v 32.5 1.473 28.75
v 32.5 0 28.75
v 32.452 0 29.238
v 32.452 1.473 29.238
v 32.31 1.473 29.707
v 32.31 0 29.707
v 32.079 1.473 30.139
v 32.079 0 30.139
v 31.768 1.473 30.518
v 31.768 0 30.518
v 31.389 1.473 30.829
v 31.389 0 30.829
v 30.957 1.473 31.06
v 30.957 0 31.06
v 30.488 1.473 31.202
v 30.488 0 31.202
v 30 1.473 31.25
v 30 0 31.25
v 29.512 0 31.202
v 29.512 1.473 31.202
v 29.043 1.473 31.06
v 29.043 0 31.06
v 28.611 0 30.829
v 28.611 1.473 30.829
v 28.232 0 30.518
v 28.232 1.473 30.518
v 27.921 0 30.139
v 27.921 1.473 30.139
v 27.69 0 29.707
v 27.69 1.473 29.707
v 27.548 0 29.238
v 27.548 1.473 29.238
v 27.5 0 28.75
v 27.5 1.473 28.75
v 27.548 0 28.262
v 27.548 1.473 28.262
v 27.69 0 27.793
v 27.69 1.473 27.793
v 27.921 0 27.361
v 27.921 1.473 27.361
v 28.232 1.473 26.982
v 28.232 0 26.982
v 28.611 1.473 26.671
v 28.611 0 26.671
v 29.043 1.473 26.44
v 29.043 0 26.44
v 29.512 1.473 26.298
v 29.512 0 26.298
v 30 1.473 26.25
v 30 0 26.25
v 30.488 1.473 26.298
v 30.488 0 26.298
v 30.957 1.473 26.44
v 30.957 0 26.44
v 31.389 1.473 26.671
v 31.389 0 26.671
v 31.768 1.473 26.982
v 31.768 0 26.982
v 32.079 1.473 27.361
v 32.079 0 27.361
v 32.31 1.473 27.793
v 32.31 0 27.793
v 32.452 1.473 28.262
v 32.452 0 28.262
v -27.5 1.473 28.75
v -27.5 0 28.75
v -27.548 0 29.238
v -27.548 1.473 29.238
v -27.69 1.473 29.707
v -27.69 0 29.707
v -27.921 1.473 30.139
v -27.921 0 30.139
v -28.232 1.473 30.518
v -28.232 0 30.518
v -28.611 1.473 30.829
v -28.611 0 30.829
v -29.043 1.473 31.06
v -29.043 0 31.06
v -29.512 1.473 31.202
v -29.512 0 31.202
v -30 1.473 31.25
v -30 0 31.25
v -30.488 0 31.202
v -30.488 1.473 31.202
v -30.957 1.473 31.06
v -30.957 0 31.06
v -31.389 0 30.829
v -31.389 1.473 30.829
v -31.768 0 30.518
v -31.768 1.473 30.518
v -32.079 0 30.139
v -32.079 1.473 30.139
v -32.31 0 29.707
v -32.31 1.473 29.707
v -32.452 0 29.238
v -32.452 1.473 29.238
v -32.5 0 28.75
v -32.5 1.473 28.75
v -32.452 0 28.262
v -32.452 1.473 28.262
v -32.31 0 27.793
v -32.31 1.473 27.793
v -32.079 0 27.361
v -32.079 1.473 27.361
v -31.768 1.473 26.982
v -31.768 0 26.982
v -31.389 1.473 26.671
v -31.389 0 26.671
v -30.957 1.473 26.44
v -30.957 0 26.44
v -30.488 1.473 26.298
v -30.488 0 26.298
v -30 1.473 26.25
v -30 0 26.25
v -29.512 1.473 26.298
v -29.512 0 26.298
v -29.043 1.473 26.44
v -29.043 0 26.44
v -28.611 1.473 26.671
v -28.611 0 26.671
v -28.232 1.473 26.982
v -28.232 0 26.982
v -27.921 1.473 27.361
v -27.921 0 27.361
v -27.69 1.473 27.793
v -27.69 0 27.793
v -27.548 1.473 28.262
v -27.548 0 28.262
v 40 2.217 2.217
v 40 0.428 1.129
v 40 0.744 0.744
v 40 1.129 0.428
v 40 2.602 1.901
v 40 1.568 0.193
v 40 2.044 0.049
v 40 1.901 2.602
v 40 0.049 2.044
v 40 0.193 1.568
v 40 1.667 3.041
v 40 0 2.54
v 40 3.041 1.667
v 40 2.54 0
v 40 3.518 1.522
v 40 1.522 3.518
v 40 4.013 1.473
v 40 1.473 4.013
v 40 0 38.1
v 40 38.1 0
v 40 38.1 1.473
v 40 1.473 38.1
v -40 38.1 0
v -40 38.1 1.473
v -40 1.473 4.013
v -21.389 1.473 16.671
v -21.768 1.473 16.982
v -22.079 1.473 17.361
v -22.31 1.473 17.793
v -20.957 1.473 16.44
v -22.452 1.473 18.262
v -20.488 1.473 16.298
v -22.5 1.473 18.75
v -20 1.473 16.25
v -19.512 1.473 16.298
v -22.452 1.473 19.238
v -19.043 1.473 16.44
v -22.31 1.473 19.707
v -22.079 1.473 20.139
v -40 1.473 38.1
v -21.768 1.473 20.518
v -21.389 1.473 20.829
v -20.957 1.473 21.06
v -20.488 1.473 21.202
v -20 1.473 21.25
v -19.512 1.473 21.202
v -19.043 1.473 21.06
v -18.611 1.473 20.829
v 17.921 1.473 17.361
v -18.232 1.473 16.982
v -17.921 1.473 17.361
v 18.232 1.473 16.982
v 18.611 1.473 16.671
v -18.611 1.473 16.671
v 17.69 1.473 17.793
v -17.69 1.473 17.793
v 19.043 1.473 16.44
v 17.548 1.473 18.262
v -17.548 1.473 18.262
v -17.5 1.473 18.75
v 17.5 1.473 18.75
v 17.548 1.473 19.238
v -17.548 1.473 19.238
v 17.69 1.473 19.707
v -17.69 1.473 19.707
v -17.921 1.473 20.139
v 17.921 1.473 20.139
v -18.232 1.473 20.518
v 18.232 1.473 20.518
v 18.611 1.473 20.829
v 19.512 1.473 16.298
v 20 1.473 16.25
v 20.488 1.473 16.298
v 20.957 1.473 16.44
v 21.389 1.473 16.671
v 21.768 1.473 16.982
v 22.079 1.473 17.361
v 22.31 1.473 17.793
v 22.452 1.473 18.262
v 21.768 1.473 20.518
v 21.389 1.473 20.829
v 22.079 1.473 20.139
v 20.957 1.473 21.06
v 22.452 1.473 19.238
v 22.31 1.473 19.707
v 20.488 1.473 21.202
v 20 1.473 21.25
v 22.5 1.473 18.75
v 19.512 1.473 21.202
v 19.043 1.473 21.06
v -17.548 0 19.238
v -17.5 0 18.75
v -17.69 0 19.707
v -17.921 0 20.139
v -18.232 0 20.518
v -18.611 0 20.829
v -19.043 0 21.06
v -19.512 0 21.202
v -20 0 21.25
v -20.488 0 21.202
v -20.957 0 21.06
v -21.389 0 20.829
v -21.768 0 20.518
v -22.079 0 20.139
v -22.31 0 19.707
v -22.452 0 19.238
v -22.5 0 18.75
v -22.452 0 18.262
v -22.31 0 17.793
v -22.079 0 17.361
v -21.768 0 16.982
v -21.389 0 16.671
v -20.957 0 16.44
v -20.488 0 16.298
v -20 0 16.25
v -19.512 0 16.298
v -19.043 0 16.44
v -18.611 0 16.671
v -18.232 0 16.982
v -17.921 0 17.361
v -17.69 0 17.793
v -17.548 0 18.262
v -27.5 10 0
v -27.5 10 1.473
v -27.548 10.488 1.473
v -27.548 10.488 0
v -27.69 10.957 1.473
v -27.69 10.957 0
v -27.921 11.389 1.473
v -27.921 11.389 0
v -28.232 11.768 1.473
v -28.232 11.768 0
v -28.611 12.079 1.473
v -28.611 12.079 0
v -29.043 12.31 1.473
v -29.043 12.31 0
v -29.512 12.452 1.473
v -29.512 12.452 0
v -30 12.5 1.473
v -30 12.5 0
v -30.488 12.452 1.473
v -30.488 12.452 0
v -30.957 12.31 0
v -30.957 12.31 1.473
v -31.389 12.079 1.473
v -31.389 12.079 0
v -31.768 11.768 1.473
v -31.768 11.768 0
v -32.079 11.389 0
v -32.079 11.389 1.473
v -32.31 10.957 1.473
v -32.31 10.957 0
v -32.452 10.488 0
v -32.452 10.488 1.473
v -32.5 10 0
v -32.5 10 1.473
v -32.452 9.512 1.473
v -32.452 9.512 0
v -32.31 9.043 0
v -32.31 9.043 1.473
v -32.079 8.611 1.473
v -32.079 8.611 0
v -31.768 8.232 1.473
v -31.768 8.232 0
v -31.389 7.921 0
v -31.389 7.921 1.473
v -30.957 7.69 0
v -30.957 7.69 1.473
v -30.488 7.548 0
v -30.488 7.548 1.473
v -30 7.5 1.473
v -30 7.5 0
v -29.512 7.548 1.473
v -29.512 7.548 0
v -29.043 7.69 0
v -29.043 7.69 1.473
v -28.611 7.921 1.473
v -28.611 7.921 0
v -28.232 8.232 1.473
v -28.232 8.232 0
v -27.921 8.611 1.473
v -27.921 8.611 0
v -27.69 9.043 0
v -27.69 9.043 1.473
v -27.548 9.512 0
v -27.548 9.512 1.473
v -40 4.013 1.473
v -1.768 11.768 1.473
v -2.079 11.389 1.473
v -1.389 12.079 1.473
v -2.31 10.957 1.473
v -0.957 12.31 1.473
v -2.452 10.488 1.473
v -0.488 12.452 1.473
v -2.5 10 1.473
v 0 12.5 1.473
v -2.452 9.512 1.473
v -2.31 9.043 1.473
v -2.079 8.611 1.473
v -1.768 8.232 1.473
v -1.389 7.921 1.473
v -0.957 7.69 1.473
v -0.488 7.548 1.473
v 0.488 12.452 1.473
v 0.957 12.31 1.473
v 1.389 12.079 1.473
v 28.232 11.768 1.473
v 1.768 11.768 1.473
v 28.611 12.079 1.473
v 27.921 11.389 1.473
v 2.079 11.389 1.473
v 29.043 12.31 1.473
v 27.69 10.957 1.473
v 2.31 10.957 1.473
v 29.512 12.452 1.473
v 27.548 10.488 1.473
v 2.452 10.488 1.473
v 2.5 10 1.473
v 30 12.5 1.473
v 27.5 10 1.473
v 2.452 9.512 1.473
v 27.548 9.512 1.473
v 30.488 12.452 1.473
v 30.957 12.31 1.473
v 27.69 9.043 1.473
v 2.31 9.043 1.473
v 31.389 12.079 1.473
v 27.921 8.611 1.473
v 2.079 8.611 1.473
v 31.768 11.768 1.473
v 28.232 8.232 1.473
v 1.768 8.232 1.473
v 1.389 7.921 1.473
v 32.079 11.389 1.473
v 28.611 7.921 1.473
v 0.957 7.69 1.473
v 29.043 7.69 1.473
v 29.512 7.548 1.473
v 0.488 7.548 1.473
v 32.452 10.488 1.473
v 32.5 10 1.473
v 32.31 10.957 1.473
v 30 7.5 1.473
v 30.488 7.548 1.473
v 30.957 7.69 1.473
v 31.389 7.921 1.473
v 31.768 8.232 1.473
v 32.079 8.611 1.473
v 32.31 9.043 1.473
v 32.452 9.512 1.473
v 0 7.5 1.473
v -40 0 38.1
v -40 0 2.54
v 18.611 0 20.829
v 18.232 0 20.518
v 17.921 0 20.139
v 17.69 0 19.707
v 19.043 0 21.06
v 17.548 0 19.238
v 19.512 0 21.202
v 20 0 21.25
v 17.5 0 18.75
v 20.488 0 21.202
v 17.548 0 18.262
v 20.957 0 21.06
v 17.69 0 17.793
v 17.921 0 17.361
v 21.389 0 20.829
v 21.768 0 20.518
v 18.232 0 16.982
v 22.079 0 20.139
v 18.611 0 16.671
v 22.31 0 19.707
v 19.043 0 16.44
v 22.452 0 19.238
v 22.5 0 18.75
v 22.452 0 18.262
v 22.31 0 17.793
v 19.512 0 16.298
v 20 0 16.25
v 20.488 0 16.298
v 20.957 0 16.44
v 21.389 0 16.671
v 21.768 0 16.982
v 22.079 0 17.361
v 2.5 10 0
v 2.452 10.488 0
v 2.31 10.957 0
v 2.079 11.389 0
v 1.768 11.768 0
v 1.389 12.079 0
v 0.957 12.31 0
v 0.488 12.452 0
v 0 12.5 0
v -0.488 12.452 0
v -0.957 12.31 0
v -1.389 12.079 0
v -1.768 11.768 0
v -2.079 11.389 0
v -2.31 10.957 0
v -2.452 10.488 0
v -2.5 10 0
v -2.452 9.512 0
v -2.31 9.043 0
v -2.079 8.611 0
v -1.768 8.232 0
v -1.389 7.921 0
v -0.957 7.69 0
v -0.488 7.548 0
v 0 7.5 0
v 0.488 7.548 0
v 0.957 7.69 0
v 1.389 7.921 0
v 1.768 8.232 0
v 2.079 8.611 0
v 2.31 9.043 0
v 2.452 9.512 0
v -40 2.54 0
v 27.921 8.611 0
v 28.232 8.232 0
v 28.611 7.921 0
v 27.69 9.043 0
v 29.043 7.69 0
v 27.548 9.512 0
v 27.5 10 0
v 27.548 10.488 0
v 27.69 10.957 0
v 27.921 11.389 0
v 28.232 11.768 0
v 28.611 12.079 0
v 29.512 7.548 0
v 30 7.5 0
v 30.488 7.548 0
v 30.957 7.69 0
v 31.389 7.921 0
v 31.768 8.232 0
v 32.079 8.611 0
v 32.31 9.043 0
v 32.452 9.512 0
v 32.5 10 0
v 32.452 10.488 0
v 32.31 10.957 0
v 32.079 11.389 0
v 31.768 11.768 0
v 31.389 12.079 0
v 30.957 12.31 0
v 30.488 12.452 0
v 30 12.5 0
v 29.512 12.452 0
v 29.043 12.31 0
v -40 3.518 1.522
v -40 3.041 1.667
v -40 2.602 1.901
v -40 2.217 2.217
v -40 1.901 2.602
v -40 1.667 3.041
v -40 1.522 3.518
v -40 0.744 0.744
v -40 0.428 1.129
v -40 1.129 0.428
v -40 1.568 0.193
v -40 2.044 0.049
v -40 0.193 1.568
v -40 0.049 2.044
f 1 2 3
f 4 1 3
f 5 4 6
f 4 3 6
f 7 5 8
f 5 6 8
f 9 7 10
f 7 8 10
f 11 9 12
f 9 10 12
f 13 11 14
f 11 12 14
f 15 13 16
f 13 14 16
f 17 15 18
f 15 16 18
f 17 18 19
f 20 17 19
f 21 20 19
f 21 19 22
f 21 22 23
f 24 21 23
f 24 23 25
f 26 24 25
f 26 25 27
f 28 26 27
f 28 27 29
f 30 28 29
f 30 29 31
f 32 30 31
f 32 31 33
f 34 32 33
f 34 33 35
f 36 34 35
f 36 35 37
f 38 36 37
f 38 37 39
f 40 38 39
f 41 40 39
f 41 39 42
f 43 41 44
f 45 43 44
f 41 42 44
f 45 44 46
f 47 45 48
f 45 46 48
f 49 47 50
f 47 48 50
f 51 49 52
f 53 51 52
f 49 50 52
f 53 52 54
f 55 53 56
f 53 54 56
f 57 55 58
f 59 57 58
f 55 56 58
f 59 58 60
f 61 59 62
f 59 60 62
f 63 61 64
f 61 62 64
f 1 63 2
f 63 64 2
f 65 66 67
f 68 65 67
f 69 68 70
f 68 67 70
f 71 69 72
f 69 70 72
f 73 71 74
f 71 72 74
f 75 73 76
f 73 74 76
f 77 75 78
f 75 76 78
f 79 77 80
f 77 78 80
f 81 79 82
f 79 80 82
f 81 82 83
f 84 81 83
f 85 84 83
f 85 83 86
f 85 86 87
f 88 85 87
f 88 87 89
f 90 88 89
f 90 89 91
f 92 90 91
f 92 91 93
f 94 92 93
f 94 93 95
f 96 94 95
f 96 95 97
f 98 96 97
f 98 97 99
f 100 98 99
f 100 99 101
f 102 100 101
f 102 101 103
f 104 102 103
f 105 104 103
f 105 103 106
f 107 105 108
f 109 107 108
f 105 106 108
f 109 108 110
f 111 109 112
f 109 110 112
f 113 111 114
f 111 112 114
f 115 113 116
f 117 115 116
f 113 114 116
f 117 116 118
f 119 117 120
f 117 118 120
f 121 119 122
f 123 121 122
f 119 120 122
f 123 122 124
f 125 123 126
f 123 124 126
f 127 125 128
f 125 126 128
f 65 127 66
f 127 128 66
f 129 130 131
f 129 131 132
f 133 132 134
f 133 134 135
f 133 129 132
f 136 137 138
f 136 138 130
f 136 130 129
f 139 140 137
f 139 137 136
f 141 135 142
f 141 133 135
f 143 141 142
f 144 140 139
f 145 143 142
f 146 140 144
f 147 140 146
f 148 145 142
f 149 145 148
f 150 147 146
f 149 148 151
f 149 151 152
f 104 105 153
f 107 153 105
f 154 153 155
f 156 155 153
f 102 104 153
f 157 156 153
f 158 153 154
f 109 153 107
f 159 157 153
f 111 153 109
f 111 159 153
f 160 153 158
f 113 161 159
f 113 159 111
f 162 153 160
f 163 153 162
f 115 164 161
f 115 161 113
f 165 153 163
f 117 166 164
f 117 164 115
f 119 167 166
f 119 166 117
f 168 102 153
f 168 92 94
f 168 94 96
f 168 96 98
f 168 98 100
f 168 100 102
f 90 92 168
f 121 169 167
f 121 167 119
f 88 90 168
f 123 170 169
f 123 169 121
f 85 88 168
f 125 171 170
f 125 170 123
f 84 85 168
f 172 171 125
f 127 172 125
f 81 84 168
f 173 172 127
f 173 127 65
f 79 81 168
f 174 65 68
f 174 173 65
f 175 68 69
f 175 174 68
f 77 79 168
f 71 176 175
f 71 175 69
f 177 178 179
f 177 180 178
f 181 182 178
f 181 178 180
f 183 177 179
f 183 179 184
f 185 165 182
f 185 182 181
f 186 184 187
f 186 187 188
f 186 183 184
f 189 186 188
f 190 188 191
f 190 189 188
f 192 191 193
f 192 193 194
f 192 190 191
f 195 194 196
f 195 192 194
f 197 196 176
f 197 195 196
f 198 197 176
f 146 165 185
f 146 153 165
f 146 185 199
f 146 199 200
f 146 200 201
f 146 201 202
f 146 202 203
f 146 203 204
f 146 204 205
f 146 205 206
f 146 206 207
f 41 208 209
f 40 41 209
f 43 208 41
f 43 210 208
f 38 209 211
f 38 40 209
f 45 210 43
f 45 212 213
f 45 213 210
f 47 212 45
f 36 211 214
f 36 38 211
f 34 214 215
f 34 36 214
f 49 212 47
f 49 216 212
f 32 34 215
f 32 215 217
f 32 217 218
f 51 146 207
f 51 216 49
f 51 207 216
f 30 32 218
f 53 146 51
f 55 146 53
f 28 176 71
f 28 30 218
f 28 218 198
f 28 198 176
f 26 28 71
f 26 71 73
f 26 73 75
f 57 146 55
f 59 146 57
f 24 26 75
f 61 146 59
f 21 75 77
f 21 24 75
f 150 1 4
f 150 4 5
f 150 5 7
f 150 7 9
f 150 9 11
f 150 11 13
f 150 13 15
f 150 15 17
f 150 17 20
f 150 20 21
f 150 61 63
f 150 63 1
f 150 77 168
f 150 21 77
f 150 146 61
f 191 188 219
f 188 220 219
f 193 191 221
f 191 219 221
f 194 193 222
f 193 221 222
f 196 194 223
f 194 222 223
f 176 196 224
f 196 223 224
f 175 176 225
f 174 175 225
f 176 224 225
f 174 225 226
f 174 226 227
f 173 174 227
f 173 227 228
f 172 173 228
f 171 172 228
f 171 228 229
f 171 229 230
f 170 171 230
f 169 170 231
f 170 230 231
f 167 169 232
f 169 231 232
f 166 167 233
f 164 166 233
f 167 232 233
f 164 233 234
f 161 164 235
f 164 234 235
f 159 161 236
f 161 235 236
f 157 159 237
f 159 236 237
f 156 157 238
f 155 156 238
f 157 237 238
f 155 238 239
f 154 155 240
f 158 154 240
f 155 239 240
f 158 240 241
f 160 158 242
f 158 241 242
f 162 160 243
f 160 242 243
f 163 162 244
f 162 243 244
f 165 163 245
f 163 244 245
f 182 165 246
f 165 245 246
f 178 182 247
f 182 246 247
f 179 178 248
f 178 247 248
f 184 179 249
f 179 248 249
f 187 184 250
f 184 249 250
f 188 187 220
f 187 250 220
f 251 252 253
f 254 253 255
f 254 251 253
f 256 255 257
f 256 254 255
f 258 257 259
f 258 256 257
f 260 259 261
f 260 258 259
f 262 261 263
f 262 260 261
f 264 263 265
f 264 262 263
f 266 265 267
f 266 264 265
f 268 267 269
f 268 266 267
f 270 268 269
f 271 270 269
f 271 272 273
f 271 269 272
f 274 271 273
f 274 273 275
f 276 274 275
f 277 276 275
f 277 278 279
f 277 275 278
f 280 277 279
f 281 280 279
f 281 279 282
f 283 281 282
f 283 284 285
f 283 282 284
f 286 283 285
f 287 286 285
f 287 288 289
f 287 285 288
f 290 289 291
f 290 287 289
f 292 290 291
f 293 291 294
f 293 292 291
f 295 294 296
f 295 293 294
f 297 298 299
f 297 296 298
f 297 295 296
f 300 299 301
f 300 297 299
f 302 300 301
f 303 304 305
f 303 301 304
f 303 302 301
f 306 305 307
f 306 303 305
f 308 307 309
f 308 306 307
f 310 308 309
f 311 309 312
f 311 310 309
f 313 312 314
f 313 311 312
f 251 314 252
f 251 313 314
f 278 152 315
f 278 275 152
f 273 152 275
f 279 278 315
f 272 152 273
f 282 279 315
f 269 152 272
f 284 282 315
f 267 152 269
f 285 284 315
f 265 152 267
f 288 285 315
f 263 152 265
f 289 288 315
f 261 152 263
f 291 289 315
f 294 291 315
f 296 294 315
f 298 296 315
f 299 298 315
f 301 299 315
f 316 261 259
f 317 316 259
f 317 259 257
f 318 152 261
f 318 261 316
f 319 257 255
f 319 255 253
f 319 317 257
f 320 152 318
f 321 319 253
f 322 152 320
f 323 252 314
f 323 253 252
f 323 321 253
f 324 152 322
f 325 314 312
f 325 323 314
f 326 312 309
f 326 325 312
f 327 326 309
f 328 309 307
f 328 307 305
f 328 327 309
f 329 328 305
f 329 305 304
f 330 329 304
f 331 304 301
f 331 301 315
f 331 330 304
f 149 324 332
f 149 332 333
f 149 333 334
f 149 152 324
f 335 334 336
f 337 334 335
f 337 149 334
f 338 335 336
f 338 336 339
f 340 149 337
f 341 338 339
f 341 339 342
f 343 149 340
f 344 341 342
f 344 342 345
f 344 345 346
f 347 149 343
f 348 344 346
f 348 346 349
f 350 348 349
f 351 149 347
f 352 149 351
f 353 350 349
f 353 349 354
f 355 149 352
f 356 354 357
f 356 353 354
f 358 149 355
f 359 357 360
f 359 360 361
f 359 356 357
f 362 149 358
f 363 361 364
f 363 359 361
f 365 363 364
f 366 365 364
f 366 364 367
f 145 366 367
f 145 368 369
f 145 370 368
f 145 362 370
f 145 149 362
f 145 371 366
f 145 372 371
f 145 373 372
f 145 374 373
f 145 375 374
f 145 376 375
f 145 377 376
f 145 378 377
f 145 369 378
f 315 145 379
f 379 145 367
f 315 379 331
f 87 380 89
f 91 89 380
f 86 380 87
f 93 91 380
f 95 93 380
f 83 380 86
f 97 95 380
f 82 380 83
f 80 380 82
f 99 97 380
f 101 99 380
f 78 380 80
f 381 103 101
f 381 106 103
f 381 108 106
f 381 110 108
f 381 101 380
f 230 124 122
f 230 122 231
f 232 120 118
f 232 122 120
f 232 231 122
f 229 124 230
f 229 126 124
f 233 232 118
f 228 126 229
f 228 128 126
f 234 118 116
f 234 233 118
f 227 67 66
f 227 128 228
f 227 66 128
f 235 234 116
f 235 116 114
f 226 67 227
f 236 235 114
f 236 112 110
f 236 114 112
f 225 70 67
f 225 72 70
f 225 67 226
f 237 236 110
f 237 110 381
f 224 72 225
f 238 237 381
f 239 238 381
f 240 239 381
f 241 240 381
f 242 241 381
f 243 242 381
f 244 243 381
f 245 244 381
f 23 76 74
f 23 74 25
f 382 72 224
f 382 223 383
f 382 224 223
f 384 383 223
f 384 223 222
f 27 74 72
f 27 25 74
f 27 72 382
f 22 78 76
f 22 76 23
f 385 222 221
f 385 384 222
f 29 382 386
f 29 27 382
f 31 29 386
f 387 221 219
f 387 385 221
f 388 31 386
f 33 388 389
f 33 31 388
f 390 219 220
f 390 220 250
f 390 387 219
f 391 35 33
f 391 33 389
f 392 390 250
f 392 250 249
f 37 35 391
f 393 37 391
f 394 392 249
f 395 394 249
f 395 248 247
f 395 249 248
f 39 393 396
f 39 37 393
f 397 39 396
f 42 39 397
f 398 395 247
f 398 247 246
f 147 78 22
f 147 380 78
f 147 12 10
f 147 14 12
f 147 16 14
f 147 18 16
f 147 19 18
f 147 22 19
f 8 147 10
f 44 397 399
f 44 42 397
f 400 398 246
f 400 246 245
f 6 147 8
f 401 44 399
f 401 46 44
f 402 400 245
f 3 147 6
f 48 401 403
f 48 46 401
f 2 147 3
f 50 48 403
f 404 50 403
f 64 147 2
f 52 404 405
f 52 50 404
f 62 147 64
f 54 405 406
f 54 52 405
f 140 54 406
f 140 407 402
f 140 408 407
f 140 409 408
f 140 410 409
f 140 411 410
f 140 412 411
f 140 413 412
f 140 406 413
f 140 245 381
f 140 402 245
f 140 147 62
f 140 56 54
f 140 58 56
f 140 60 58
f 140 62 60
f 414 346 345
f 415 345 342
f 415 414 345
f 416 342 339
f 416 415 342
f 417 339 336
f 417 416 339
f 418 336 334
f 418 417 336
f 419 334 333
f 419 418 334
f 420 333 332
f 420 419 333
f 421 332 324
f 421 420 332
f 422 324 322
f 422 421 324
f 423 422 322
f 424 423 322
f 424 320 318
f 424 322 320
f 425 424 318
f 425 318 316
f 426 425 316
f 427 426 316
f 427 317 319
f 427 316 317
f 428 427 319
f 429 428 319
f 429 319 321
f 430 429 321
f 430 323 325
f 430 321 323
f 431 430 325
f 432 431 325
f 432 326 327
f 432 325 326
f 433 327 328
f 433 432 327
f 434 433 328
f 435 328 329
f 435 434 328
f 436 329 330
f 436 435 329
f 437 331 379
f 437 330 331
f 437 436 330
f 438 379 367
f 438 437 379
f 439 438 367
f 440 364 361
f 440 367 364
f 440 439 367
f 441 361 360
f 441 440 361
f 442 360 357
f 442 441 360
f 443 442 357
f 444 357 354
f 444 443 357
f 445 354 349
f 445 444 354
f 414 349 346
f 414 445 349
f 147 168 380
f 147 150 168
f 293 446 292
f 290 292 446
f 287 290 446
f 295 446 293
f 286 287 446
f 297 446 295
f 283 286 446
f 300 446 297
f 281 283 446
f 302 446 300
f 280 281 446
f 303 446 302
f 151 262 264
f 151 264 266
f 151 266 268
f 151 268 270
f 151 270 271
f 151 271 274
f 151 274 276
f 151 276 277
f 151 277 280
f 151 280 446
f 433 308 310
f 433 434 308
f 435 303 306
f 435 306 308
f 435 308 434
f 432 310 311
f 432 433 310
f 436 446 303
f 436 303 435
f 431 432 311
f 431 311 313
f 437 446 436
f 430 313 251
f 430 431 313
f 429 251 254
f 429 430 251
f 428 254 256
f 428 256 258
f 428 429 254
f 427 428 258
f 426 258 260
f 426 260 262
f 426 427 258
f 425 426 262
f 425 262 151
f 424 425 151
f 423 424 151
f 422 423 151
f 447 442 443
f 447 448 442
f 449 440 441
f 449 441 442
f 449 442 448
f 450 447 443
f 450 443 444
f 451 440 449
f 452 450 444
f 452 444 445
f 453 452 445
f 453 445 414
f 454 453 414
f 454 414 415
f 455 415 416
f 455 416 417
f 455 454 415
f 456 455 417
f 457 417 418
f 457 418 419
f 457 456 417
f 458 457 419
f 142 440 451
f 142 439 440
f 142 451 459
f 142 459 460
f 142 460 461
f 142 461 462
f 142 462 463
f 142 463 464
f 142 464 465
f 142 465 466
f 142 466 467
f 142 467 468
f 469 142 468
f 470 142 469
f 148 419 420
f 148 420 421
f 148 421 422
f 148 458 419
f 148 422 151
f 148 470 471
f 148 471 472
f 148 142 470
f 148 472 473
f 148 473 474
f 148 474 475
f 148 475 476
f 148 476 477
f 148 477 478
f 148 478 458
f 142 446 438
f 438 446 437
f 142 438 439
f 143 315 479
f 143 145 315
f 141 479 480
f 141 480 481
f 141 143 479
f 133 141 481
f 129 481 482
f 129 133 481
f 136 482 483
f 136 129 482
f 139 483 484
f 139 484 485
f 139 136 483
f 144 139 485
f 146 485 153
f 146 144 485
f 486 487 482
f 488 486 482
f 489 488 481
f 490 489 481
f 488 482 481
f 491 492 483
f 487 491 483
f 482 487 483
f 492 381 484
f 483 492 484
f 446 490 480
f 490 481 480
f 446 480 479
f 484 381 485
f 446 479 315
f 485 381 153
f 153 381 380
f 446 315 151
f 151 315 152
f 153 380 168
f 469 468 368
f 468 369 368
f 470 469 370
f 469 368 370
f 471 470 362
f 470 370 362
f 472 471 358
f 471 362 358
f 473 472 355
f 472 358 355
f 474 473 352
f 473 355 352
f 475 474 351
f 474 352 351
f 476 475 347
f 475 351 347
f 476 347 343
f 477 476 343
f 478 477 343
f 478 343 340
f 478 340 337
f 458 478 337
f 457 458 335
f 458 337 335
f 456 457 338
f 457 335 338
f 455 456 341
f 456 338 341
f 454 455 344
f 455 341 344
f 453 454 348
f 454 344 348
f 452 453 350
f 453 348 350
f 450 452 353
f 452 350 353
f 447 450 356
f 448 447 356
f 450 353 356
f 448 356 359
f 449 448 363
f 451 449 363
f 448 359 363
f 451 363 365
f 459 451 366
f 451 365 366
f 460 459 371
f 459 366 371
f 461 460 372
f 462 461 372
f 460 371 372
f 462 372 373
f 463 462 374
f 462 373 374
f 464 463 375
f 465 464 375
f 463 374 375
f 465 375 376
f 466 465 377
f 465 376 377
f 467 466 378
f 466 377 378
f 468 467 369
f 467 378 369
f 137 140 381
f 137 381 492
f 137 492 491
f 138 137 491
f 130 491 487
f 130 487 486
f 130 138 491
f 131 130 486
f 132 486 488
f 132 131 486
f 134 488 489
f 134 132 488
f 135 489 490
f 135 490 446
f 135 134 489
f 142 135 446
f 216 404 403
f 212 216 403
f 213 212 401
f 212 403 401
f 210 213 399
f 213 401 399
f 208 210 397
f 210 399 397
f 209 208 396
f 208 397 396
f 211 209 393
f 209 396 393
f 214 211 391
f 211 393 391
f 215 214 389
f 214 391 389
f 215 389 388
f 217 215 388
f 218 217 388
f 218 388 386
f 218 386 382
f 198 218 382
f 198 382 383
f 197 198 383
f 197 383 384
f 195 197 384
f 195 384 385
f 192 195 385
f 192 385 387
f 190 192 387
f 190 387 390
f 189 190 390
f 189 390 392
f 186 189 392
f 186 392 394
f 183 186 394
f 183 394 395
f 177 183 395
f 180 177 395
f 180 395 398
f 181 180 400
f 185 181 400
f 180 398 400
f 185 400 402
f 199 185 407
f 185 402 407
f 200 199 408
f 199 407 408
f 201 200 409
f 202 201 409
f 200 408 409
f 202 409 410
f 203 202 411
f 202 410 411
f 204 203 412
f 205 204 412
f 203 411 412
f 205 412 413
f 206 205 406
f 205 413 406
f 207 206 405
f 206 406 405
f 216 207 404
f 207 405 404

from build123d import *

# Parameters (mm, degrees)
F1_DEPTH = 40
F2_R     = 2.5
F3_DEPTH = 12.7
F4_R     = 2.5
F5_DEPTH = 12.7


with BuildPart() as f1:
    # F0 (on Right) → F1 (new body, symmetric)
    with BuildSketch(Plane.YZ):
        with BuildLine():
            Line((1.4732, 38.1), (0, 38.1))
            Line((0, 38.1), (0, 2.54))
            ThreePointArc((0, 2.54), (0.7439487758, 0.7439487758), (2.54, 0))
            Line((2.54, 0), (38.1, 0))
            Line((38.1, 0), (38.1, 1.4732))
            Line((38.1, 1.4732), (4.0132, 1.4732))
            ThreePointArc((4.0132, 1.4732), (2.2171487758, 2.2171487758), (1.4732, 4.0132))
            Line((1.4732, 4.0132), (1.4732, 38.1))
        make_face()
    extrude(amount=F1_DEPTH, both=True)

    # F2 (on Top) → F3 (cut, symmetric)
    with BuildSketch(Plane.XY):
        with Locations((-30, 10)):
            Circle(F2_R)
        with Locations((0, 10)):
            Circle(F2_R)
        with Locations((30, 10)):
            Circle(F2_R)
    extrude(amount=F3_DEPTH, both=True, mode=Mode.SUBTRACT)

    # F4 (on Front) → F5 (cut, symmetric)
    with BuildSketch(Plane.XZ):
        with Locations((-30, 28.75)):
            Circle(F4_R)
        with Locations((30, 28.75)):
            Circle(F4_R)
        with Locations((20, 18.75)):
            Circle(F4_R)
        with Locations((-20, 18.75)):
            Circle(F4_R)
    extrude(amount=F5_DEPTH, both=True, mode=Mode.SUBTRACT)


solid = f1.part
